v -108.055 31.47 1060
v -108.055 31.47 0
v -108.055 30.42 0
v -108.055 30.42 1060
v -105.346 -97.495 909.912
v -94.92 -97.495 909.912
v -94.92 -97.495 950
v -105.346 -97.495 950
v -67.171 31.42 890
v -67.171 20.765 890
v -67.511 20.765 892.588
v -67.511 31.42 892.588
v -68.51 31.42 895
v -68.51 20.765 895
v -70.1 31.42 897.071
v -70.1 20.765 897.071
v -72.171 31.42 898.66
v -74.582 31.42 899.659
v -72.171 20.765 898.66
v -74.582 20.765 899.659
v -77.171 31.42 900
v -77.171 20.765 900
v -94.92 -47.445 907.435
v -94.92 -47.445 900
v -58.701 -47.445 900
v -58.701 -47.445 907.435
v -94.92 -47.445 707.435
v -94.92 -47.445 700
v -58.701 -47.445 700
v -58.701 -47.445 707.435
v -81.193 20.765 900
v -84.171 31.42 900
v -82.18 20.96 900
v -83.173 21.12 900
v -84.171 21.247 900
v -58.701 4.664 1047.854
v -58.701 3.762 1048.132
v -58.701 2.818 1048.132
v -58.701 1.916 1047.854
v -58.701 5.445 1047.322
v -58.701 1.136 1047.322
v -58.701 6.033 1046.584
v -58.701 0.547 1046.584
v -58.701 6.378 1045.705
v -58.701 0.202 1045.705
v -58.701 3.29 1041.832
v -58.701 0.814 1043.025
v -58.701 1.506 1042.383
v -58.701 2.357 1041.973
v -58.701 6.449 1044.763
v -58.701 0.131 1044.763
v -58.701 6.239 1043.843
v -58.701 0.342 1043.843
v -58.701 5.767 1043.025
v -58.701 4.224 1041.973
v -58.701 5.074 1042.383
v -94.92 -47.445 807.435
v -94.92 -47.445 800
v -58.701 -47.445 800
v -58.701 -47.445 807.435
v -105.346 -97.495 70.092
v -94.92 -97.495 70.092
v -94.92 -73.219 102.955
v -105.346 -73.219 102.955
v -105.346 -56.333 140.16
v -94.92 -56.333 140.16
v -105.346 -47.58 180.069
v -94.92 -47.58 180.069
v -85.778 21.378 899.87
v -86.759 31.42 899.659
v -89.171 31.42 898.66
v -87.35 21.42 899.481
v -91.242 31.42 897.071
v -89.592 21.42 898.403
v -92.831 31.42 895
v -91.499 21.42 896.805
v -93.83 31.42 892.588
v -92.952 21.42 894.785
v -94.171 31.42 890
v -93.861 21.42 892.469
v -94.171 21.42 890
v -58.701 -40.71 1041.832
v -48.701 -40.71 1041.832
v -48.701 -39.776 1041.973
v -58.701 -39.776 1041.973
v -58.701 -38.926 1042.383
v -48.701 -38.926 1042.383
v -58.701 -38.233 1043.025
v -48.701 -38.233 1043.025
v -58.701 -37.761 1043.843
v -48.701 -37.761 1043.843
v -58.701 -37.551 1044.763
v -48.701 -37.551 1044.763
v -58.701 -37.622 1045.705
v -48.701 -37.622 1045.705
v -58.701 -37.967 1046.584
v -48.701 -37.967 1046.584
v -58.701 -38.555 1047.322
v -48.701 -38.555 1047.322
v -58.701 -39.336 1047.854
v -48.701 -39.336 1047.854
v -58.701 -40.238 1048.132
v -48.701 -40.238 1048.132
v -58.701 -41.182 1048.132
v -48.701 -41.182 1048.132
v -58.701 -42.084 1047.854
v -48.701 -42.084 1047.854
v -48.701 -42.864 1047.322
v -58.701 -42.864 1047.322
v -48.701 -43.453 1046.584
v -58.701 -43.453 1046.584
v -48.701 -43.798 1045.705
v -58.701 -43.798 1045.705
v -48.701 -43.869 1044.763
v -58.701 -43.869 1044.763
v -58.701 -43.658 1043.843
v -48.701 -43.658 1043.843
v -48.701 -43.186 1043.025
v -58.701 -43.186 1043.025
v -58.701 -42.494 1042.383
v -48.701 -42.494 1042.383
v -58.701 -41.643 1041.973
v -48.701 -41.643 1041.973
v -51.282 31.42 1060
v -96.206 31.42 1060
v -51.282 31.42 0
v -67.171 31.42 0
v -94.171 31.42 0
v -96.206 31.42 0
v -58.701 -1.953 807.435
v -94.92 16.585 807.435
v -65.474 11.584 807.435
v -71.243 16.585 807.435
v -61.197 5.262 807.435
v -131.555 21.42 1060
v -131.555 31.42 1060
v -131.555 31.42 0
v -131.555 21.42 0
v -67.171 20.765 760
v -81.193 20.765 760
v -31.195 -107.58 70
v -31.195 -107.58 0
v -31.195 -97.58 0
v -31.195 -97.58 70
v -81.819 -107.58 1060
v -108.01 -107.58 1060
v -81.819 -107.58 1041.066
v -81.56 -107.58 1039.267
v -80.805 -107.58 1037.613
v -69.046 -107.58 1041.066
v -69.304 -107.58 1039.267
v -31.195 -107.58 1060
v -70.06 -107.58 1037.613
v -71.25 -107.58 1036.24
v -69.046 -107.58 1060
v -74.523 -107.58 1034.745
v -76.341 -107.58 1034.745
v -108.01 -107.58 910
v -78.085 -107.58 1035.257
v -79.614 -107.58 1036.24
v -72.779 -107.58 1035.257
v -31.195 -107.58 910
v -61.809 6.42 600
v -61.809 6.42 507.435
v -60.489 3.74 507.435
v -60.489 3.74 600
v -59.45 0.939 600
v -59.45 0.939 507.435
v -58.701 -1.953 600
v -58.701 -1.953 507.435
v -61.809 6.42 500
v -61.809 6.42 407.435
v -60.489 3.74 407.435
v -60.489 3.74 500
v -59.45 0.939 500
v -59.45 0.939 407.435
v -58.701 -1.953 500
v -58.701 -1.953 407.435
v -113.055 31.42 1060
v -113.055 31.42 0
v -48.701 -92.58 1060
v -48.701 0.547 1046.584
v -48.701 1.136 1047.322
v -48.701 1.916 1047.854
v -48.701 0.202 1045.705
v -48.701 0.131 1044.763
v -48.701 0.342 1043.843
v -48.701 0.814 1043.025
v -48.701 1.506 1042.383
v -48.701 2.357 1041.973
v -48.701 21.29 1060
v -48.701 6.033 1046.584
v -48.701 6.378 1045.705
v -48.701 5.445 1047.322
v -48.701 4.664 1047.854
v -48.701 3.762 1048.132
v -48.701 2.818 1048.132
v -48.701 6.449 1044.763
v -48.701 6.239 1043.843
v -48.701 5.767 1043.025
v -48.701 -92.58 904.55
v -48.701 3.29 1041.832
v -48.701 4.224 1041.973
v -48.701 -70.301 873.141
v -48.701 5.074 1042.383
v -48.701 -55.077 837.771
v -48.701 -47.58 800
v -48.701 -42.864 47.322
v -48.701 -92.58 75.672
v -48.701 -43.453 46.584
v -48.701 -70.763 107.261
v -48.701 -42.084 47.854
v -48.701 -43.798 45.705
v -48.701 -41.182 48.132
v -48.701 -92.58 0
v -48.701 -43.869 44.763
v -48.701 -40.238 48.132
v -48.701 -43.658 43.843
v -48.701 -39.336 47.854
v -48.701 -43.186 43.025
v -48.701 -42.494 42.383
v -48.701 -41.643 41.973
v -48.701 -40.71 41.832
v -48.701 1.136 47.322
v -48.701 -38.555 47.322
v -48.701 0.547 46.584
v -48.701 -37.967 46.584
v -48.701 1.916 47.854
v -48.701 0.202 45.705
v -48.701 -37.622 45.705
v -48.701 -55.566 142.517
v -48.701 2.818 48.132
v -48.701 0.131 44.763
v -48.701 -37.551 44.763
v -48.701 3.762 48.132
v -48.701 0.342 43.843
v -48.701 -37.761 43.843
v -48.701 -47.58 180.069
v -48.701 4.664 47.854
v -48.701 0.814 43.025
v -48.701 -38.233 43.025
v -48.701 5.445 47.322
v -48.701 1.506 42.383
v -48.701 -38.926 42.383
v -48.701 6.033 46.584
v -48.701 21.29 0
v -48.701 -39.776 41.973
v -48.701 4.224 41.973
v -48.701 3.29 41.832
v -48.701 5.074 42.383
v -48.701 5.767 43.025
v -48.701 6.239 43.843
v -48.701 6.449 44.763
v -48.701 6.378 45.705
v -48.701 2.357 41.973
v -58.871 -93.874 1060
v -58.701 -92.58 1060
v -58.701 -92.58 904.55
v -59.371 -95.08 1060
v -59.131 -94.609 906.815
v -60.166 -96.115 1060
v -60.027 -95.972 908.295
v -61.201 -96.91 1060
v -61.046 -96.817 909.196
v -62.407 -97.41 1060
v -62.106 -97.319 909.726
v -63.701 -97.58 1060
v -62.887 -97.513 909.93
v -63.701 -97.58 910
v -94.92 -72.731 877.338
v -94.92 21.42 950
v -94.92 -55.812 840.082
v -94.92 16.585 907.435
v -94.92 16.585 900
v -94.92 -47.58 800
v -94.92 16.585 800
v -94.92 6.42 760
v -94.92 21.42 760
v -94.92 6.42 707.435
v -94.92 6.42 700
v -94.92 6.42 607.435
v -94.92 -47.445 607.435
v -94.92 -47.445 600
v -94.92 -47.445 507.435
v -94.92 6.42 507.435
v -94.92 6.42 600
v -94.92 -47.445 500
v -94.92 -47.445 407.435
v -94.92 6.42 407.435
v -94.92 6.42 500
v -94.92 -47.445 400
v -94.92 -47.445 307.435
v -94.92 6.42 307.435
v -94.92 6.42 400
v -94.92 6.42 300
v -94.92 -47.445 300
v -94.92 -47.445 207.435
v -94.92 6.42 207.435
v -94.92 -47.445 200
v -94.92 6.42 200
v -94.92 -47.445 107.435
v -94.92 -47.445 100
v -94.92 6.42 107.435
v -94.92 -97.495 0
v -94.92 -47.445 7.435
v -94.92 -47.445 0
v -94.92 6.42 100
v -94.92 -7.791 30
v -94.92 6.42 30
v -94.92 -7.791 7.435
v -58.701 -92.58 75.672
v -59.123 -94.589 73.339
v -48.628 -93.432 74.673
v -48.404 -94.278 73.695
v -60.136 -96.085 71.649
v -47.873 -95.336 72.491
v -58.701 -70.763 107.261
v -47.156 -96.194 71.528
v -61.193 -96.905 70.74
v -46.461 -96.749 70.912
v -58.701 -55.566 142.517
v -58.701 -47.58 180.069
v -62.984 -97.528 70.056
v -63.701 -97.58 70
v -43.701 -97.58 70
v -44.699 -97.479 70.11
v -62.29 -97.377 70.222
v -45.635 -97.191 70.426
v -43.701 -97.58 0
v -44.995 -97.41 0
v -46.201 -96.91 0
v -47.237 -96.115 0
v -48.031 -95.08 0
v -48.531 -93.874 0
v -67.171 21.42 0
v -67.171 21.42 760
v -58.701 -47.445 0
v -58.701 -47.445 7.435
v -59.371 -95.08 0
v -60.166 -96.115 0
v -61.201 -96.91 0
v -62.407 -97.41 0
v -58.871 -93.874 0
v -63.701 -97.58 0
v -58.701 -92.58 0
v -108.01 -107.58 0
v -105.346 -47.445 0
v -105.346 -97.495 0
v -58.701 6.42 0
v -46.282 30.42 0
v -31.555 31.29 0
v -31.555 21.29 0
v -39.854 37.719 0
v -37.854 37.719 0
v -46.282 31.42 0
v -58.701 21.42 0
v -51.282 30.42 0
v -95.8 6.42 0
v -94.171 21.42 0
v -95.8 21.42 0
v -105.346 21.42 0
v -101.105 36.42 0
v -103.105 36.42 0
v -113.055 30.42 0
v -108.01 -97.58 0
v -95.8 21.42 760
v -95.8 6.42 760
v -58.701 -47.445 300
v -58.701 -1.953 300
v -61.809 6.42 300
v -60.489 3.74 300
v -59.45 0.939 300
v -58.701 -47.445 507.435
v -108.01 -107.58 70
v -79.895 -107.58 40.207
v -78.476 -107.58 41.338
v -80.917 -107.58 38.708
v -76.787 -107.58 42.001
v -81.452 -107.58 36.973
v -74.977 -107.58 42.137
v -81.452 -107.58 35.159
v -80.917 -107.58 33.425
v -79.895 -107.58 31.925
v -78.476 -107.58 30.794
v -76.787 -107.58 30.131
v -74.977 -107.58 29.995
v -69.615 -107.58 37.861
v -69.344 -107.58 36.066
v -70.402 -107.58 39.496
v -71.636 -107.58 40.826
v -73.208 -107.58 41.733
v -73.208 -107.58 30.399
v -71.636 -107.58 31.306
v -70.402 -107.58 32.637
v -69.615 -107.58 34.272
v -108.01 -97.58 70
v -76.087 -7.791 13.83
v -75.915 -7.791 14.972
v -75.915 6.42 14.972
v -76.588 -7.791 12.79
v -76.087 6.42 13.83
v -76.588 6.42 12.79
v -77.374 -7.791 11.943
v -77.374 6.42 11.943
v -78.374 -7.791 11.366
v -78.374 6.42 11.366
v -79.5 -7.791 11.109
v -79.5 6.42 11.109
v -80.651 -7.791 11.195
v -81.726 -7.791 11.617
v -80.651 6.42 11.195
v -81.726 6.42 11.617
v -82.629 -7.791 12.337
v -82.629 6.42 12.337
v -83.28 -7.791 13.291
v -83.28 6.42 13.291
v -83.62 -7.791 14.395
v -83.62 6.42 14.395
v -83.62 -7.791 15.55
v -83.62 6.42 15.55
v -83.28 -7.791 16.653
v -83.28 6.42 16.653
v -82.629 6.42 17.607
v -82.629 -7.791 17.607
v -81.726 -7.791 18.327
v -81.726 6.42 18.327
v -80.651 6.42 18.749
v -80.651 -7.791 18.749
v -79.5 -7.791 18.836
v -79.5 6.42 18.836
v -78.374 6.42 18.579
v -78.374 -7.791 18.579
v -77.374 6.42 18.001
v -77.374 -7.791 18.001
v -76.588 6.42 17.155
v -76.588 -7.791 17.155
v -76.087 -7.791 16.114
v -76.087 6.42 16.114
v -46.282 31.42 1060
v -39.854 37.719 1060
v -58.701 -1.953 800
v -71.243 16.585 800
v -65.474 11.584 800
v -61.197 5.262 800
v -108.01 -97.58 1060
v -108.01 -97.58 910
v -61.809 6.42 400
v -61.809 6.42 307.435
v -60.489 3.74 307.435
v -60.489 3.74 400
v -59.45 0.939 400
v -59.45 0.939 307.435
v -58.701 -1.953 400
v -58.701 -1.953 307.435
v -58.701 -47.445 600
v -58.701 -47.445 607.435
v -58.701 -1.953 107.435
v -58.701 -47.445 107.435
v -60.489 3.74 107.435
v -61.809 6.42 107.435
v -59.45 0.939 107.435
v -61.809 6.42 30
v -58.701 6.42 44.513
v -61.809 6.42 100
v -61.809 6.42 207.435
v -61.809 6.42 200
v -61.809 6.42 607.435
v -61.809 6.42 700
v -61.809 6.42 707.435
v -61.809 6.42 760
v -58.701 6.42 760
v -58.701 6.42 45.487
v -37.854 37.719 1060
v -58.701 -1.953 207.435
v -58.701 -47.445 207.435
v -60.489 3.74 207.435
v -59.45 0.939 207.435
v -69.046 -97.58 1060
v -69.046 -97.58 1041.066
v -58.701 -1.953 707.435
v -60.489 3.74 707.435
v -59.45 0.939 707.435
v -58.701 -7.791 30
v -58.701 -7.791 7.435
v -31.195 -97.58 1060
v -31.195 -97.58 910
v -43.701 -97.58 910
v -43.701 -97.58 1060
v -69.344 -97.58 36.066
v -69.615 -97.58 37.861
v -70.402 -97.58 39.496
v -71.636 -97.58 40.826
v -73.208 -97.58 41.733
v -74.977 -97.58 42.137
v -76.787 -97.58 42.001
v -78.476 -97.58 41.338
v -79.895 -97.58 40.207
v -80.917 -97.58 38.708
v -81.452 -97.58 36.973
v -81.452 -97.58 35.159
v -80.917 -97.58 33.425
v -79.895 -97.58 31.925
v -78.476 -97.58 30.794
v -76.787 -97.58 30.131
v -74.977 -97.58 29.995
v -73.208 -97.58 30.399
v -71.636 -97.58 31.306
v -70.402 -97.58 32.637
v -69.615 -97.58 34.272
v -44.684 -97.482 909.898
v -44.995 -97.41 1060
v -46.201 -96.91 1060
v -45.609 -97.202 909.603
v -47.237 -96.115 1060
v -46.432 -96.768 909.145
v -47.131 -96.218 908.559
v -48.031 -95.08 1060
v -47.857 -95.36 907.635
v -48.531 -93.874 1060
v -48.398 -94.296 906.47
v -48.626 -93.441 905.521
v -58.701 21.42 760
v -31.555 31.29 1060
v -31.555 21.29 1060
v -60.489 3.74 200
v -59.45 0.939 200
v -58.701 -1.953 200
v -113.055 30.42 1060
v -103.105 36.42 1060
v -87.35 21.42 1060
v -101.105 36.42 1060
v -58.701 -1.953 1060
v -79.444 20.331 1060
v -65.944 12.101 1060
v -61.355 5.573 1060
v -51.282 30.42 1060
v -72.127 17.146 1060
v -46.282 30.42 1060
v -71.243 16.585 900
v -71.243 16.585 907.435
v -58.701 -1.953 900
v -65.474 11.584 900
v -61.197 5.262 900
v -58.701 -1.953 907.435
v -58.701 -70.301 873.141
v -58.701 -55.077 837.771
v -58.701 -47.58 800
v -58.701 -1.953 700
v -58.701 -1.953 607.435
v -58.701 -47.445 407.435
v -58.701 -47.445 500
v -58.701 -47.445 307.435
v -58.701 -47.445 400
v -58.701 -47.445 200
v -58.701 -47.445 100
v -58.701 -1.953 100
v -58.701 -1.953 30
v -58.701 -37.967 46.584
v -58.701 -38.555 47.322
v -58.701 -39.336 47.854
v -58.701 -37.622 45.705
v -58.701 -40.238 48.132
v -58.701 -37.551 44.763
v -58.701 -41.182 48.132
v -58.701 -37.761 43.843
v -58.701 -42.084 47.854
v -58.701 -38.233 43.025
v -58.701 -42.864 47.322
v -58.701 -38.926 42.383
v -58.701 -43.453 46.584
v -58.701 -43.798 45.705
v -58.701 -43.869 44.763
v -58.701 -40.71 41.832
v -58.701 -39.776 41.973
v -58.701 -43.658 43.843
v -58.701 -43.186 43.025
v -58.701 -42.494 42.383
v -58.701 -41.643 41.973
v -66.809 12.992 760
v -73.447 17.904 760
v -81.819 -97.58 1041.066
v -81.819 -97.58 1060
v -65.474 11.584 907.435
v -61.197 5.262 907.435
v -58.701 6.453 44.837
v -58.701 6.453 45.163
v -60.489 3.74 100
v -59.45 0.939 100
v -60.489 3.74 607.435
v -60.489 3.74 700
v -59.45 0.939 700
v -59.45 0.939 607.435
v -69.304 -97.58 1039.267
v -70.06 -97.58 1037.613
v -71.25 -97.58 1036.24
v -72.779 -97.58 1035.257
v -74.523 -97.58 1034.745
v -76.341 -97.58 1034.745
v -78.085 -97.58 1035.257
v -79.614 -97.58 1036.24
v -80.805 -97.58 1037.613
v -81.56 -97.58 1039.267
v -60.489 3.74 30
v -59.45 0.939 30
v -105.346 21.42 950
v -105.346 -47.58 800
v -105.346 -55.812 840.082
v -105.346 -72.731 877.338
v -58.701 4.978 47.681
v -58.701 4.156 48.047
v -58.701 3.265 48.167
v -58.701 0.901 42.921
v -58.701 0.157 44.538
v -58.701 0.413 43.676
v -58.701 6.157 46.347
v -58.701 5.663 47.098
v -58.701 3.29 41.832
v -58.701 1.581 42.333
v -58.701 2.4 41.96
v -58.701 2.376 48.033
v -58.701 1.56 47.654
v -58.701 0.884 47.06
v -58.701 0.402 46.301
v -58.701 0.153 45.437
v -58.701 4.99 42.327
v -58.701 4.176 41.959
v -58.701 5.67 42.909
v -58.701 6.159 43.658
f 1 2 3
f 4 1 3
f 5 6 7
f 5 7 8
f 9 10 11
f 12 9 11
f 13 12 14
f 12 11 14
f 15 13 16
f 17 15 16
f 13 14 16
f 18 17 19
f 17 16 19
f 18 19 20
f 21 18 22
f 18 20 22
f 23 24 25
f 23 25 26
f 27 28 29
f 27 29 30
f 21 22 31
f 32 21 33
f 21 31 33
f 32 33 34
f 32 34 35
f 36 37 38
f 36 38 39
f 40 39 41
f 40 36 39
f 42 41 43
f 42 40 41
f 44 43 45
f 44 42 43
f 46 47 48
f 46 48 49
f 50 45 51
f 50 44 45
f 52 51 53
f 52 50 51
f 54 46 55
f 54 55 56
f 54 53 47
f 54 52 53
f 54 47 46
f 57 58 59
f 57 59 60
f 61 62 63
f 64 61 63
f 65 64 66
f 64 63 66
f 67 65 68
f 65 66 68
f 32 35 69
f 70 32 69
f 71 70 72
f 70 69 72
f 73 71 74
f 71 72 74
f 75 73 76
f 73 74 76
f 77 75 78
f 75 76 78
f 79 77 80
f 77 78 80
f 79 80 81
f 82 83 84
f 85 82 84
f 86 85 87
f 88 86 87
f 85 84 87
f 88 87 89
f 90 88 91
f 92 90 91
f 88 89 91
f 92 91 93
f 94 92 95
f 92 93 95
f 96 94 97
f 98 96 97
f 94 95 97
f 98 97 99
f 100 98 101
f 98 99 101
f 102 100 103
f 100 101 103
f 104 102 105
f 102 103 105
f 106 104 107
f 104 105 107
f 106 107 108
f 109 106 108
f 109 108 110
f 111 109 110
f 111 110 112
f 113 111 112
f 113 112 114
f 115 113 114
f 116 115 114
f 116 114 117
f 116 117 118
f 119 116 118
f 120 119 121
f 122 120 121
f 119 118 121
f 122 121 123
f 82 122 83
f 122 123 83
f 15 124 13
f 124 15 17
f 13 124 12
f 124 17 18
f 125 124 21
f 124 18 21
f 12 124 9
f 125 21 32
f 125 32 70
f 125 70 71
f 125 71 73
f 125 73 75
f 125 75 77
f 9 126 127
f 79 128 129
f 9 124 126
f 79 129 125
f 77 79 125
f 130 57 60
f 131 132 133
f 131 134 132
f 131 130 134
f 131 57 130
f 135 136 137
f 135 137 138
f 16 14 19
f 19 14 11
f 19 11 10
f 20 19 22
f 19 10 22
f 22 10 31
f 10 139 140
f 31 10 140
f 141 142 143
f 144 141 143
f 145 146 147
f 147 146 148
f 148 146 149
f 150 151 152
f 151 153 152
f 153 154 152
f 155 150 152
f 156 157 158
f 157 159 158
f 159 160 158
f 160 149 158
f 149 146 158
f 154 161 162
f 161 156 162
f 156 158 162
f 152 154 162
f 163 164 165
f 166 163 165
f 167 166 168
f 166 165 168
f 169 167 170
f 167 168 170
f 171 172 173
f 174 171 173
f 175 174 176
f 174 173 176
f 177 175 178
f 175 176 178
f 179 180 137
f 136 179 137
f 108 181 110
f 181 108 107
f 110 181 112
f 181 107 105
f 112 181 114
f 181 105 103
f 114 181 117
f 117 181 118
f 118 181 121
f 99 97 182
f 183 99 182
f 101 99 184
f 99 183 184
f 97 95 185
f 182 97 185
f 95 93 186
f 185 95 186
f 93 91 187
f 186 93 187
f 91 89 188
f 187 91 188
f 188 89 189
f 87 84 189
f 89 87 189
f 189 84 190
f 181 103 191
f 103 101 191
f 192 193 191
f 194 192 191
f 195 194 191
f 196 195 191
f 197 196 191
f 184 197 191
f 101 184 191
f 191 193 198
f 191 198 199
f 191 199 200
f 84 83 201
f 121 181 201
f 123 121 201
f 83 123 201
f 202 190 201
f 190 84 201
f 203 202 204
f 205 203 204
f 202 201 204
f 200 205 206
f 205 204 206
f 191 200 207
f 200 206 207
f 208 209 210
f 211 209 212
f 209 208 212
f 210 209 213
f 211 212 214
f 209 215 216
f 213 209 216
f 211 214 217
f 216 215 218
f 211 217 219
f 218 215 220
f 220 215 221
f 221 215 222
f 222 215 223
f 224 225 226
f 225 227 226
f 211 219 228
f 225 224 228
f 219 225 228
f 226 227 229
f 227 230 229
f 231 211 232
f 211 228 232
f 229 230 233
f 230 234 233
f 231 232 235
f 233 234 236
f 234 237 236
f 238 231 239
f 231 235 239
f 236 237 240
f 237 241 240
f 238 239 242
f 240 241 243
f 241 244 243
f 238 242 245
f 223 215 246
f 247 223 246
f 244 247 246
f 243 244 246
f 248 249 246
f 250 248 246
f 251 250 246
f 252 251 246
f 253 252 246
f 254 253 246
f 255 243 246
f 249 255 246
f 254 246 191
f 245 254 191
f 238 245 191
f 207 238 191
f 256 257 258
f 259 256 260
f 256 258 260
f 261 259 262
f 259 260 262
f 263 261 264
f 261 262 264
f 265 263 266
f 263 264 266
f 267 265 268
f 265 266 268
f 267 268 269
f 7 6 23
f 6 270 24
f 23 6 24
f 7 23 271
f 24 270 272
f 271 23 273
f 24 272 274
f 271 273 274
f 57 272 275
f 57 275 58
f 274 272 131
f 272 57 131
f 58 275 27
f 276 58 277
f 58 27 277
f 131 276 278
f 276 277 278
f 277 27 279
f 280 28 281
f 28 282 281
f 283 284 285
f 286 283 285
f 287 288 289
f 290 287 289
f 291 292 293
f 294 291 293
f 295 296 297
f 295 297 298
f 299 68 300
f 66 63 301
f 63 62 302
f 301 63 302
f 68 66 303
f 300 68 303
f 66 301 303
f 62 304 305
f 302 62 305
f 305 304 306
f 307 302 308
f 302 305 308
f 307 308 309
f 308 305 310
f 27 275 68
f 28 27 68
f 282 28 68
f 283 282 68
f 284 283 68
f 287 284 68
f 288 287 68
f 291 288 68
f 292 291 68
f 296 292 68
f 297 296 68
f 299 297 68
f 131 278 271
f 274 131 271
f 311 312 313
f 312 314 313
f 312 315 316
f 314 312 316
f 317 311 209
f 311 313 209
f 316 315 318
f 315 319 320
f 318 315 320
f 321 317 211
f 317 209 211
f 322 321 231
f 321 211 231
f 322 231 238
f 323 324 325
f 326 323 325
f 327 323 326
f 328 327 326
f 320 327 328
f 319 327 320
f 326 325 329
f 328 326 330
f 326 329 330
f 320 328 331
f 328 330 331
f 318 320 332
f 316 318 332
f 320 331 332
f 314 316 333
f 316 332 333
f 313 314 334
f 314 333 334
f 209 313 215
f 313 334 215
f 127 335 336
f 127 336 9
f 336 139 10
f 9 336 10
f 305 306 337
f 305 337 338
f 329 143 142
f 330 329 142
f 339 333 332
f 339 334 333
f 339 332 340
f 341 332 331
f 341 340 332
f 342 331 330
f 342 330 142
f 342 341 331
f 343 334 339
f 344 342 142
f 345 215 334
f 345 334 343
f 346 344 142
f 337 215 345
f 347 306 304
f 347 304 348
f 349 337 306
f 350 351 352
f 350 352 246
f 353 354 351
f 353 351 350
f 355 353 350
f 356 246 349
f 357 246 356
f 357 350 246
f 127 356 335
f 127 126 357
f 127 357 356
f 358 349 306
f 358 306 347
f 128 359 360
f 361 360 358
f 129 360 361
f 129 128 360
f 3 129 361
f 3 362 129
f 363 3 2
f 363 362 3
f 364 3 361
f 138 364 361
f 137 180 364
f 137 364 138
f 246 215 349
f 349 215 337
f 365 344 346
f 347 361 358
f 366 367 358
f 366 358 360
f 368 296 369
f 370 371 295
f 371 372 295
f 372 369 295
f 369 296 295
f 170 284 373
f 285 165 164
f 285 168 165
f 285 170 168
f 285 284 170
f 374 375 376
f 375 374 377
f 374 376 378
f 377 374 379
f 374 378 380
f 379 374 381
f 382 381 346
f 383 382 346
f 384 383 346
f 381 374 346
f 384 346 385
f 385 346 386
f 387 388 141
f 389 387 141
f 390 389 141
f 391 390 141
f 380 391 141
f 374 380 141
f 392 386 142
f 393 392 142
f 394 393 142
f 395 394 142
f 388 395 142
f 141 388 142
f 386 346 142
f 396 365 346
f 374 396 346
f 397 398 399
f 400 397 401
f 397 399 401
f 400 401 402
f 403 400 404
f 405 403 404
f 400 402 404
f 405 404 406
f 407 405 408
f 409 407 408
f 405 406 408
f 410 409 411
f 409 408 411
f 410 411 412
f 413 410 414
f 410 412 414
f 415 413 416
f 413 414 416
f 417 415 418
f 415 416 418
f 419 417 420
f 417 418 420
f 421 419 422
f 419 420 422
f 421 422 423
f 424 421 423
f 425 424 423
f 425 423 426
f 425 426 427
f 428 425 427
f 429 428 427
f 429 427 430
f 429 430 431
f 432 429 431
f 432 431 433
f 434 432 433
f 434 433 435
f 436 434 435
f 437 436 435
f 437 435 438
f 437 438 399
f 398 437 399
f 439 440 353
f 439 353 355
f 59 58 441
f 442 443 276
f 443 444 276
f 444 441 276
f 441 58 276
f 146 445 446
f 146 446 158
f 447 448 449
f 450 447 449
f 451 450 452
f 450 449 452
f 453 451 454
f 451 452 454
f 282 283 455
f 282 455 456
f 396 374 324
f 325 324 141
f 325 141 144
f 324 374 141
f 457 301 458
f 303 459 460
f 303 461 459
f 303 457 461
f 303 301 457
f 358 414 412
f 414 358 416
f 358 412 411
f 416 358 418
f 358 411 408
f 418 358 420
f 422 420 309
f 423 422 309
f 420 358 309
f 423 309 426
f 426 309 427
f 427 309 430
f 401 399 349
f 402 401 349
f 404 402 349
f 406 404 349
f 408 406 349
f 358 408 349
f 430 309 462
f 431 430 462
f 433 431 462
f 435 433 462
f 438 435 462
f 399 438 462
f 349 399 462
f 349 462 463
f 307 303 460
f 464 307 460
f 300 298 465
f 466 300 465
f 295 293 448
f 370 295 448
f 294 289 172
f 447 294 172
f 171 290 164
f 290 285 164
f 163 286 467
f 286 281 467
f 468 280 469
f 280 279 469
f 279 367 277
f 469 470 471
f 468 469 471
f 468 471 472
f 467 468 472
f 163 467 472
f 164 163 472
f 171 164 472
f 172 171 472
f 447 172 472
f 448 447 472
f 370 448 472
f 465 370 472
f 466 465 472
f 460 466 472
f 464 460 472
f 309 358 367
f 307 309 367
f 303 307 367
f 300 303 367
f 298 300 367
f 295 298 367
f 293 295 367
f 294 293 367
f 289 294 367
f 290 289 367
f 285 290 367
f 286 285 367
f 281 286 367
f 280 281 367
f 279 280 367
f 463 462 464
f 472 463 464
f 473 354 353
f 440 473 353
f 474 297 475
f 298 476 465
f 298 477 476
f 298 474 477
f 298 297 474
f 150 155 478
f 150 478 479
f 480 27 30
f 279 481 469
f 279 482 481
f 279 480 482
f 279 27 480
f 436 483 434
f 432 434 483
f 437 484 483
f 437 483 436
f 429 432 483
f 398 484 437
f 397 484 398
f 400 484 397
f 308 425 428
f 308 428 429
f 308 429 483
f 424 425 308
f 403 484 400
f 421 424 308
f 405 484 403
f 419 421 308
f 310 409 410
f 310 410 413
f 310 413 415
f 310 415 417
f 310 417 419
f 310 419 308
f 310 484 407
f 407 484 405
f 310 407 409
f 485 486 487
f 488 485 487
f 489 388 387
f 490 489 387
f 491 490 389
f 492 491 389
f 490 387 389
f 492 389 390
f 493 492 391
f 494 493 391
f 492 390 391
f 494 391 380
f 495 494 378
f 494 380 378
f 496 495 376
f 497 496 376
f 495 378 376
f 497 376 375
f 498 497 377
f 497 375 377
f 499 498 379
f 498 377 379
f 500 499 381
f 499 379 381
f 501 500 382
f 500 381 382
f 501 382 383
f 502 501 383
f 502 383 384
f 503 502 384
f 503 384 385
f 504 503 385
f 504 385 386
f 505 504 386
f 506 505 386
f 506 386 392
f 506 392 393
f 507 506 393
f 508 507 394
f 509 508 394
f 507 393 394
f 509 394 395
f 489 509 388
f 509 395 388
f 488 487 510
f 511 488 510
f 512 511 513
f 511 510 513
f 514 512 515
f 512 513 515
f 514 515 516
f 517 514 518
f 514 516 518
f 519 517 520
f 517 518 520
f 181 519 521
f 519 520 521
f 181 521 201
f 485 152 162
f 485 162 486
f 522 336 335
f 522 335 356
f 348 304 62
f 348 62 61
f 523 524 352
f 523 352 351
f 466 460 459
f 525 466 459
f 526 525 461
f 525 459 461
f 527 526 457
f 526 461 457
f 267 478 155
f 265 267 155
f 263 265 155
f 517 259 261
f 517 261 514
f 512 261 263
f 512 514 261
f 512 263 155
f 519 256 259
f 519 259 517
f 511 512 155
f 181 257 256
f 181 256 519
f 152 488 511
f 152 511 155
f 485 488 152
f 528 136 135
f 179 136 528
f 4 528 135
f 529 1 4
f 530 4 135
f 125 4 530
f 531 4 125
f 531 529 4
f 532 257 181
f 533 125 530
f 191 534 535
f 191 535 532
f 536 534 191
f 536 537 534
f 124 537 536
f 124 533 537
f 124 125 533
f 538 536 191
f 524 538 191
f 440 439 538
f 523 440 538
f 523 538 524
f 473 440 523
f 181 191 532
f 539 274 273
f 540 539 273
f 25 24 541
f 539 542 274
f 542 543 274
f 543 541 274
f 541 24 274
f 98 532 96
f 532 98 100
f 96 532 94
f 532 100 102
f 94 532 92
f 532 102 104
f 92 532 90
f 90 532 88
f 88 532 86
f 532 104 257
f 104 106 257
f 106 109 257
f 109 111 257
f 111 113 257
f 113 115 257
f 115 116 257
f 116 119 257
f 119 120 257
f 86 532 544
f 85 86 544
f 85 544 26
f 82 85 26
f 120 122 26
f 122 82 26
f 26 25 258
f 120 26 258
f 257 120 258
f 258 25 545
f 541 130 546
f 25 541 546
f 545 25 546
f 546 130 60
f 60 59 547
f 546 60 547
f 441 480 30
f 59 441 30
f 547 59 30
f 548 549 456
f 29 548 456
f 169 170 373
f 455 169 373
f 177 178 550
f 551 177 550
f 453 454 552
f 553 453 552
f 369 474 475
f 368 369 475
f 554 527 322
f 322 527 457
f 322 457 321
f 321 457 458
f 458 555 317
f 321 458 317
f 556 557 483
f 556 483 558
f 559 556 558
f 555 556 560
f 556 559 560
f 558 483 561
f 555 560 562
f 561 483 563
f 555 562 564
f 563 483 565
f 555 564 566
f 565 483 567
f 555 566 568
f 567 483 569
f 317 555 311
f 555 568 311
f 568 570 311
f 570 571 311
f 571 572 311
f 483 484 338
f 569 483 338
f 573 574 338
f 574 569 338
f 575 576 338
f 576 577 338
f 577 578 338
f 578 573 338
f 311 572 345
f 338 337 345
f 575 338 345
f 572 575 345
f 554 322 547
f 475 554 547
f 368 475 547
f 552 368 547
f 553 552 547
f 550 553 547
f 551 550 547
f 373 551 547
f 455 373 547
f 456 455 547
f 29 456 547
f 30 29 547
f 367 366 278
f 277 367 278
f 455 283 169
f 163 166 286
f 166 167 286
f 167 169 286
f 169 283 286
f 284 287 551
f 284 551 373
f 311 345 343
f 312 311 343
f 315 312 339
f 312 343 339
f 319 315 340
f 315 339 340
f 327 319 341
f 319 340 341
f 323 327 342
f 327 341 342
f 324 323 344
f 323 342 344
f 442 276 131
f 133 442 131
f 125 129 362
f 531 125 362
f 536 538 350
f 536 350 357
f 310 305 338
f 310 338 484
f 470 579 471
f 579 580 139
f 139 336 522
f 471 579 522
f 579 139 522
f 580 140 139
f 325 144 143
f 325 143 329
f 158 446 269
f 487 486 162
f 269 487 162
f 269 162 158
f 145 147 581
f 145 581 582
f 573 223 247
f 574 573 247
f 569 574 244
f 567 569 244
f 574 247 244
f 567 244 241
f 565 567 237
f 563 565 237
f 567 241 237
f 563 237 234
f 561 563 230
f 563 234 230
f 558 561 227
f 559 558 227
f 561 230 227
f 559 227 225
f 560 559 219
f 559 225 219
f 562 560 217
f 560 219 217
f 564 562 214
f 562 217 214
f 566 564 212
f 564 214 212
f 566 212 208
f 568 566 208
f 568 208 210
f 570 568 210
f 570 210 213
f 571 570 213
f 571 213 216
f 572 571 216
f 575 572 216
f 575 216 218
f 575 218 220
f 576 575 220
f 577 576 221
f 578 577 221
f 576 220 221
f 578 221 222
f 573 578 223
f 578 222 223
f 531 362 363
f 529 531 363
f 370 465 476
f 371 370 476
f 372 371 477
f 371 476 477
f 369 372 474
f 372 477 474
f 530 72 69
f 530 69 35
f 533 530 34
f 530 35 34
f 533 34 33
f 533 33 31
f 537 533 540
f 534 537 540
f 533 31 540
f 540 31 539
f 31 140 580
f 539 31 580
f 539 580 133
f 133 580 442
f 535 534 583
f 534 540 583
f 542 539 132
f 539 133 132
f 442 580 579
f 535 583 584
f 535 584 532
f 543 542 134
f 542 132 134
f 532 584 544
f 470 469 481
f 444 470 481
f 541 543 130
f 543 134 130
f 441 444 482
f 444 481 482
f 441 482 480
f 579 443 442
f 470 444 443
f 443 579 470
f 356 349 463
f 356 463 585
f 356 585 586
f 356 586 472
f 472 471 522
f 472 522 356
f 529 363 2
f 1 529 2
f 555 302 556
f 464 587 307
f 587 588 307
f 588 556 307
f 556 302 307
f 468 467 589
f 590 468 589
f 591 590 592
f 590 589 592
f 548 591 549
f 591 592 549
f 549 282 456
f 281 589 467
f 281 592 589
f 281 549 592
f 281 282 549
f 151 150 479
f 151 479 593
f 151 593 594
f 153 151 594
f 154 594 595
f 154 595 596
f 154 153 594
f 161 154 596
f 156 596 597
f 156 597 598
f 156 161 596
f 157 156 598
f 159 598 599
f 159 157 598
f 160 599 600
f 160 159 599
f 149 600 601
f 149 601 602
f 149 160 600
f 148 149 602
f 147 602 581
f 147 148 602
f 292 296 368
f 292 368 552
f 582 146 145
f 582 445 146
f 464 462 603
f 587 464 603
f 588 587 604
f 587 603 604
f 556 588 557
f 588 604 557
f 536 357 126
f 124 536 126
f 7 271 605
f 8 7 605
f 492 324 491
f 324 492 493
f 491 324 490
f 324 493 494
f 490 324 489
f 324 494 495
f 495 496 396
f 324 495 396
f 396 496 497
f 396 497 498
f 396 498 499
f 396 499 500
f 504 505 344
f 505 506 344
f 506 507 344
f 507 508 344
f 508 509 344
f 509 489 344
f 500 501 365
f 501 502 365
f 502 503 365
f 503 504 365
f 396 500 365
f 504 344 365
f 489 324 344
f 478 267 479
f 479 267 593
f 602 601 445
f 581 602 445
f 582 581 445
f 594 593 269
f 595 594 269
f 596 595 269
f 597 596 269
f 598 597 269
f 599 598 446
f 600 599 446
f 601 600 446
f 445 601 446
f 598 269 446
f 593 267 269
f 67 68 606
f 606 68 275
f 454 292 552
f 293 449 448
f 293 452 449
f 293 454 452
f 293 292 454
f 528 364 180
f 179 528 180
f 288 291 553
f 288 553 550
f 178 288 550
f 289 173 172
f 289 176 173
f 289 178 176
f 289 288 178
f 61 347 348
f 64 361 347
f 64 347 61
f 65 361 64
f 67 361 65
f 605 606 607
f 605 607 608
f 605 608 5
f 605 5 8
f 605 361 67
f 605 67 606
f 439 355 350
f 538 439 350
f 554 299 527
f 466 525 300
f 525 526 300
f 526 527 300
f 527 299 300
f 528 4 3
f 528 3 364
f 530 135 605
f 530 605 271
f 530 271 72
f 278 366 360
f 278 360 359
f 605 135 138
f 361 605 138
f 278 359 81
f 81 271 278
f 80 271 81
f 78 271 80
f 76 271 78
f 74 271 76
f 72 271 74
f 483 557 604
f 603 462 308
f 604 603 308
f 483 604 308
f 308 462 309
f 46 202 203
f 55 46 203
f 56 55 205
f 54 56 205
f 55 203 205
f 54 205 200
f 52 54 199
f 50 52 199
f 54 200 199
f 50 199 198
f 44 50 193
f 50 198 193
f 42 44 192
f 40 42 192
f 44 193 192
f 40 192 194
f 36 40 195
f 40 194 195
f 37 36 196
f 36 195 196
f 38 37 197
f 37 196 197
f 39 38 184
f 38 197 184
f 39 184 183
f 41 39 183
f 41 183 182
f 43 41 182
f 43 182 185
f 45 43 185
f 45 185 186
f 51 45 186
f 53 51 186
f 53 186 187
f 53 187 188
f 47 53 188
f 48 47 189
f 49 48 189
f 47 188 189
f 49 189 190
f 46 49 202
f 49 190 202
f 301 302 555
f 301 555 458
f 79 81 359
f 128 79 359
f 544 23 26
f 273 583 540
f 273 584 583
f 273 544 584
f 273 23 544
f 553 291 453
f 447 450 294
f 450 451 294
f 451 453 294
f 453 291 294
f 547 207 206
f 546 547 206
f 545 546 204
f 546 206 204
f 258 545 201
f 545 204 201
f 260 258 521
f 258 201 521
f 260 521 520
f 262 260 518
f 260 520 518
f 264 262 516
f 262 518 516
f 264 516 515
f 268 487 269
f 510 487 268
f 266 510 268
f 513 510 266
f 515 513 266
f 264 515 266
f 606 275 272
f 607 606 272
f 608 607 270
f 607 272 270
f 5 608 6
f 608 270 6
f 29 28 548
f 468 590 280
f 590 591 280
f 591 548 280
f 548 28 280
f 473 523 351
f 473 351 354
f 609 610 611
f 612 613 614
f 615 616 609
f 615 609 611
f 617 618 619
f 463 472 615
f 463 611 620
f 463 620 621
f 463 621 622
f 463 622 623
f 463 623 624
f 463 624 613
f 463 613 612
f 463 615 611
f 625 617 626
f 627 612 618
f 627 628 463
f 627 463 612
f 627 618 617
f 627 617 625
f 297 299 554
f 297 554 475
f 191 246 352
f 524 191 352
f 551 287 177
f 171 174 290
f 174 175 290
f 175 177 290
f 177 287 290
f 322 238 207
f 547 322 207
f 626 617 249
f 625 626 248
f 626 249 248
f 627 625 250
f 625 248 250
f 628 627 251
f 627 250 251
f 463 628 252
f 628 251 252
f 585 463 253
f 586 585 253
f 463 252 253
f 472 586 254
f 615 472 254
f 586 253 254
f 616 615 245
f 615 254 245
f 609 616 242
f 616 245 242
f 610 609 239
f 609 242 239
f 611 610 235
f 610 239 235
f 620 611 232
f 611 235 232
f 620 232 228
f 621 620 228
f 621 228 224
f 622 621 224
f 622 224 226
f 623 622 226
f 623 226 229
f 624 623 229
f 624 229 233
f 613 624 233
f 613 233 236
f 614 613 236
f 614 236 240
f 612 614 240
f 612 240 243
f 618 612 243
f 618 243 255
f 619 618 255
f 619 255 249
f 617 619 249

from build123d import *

# Parameters (mm, degrees)
BOSS_EXTRUDE1_DEPTH         = 1060
CUT_EXTRUDE1_DEPTH          = 800
SKETCH5_W                   = 10.426623187
SKETCH5_H                   = 125.292137731
BOSS_EXTRUDE2_DEPTH         = 950
SKETCH6_W                   = 7.435137382
SKETCH6_H                   = 64.029540506
BOSS_EXTRUDE3_DEPTH         = 50
LPATTERN1_COUNT             = 10
LPATTERN1_PITCH             = 100
CUT_EXTRUDE3_DEPTH          = 10
CUT_EXTRUDE3_DEPTH_BACK     = 100
CUT_EXTRUDE2_START          = -300
SKETCH3_W                   = 37.098457344
SKETCH3_H                   = 15
CUT_EXTRUDE2_DEPTH          = 1000
SKETCH7_W                   = 41.986295648
SKETCH7_H                   = 14.210937294
BOSS_EXTRUDE4_DEPTH         = 30
SKETCH8_R                   = 3.874254892
CUT_EXTRUDE4_DEPTH          = 30
SKETCH_1_R                  = 3.167509586
CUT_EXTRUDE_1_DEPTH         = 10
PATTERN_LINEAR_1_COUNT      = 2
PATTERN_LINEAR_1_PITCH      = 44
PATTERN_LINEAR_1_COUNT_DIR2 = 2
PATTERN_LINEAR_1_PITCH_DIR2 = 1000
SKETCH9_R                   = 6.088028913
CUT_EXTRUDE5_DEPTH          = 10
LPATTERN2_COUNT             = 2
LPATTERN2_PITCH             = 1005
CUT_EXTRUDE6_DEPTH          = 10


with BuildPart() as part:
    # Sketch1 → Boss-Extrude1 (new body)
    with BuildSketch(Plane.XY):
        with BuildLine():
            Line((-31.555119126, 31.290150882), (-37.853807036, 37.718722311))
            Line((-37.853807036, 37.718722311), (-39.853807036, 37.718722311))
            Line((-39.853807036, 37.718722311), (-46.282378465, 31.420034401))
            Line((-46.282378465, 31.420034401), (-46.282378465, 30.420034401))
            Line((-46.282378465, 30.420034401), (-51.282378465, 30.420034401))
            Line((-51.282378465, 30.420034401), (-51.282378465, 31.420034401))
            Line((-51.282378465, 31.420034401), (-96.206307824, 31.420034401))
            Line((-96.206307824, 31.420034401), (-101.105287309, 36.420034401))
            Line((-101.105287309, 36.420034401), (-103.105287309, 36.420034401))
            Line((-103.105287309, 36.420034401), (-108.055034777, 31.470286932))
            Line((-108.055034777, 31.470286932), (-108.055034777, 30.420034401))
            Line((-108.055034777, 30.420034401), (-113.055034777, 30.420034401))
            Line((-113.055034777, 30.420034401), (-113.055034777, 31.420034401))
            Line((-113.055034777, 31.420034401), (-131.555034777, 31.420034401))
            Line((-131.555034777, 31.420034401), (-131.555034777, 21.420034401))
            Line((-131.555034777, 21.420034401), (-87.349569261, 21.420034401))
            ThreePointArc((-87.349569261, 21.420034401), (-68.862935324, 14.835575372), (-58.701074529, -1.95273366))
            Line((-58.701074529, -1.95273366), (-58.701074529, -92.579965599))
            ThreePointArc((-58.701074529, -92.579965599), (-60.165540623, -96.115499505), (-63.701074529, -97.579965599))
            Line((-63.701074529, -97.579965599), (-108.009983562, -97.579965599))
            Line((-108.009983562, -97.579965599), (-108.009983562, -107.579965599))
            Line((-108.009983562, -107.579965599), (-31.195424592, -107.579965599))
            Line((-31.195424592, -107.579965599), (-31.195424592, -97.579965599))
            Line((-31.195424592, -97.579965599), (-43.701074529, -97.579965599))
            ThreePointArc((-43.701074529, -97.579965599), (-47.236608435, -96.115499505), (-48.701074529, -92.579965599))
            Line((-48.701074529, -92.579965599), (-48.701074529, 21.290150882))
            Line((-48.701074529, 21.290150882), (-31.555119126, 21.290150882))
            Line((-31.555119126, 21.290150882), (-31.555119126, 31.290150882))
        make_face()
    extrude(amount=BOSS_EXTRUDE1_DEPTH)

    # Sketch2 → Cut-Extrude1 (cut)
    with BuildSketch(Plane(origin=(0, 20.764722339, 0), x_dir=(1, 0, 0), z_dir=(0, 1, 0))):
        with BuildLine():
            Line((-84.170689991, 100), (-77.170689991, 100))
            ThreePointArc((-77.170689991, 100), (-70.099622179, 97.071067812), (-67.170689991, 90))
            Line((-67.170689991, 90), (-67.170689991, -890))
            ThreePointArc((-67.170689991, -890), (-70.099622179, -897.071067812), (-77.170689991, -900))
            Line((-77.170689991, -900), (-84.170689991, -900))
            ThreePointArc((-84.170689991, -900), (-91.241757803, -897.071067812), (-94.170689991, -890))
            Line((-94.170689991, -890), (-94.170689991, 90))
            ThreePointArc((-94.170689991, 90), (-91.241757803, 97.071067812), (-84.170689991, 100))
        make_face()
    extrude(amount=CUT_EXTRUDE1_DEPTH, mode=Mode.SUBTRACT)

    # Sketch5 → Boss-Extrude2 (add)
    with BuildSketch(Plane(origin=(0, 0, 0), x_dir=(-1, 0, 0), z_dir=(0, 0, -1))):
        with Locations((100.133130522, -34.849417223)):
            Rectangle(SKETCH5_W, SKETCH5_H)
    extrude(amount=-BOSS_EXTRUDE2_DEPTH)

    # Sketch6 → Boss-Extrude3 (add)
    with BuildSketch(Plane.ZY.offset(105.346442115)):
        with Locations((3.717568691, -15.430068515)):
            Rectangle(SKETCH6_W, SKETCH6_H)
    boss_extrude3 = extrude(amount=-BOSS_EXTRUDE3_DEPTH)

    # LPattern1: Boss-Extrude3 ×10
    with Locations(*[(0, 0, i * LPATTERN1_PITCH) for i in range(1, LPATTERN1_COUNT)]):
        add(boss_extrude3)

    # Sketch4 → Cut-Extrude3 (cut, two sides)
    with BuildSketch(Plane(origin=(-31.555119126, 0, 0), x_dir=(0, 0, -1), z_dir=(1, 0, 0))) as cut_extrude3_sk:
        with BuildLine():
            Line((-910, -97.579965599), (-910, -107.579965599))
            Line((-910, -107.579965599), (-910, -177.956634241))
            Line((-910, -177.956634241), (-70, -177.956634241))
            Line((-70, -177.956634241), (-70, -97.579965599))
            ThreePointArc((-70, -97.579965599), (-121.056751887, -63.823667059), (-180.068799532, -47.579965599))
            Line((-180.068799532, -47.579965599), (-800, -47.579965599))
            ThreePointArc((-800, -47.579965599), (-859.23910305, -63.253938888), (-910, -97.579965599))
        make_face()
    extrude(amount=CUT_EXTRUDE3_DEPTH, mode=Mode.SUBTRACT)
    extrude(cut_extrude3_sk.sketch, amount=-CUT_EXTRUDE3_DEPTH_BACK, mode=Mode.SUBTRACT)

    # Sketch3 → Cut-Extrude2 (cut)
    with BuildSketch(Plane.XY.offset(1060).offset(CUT_EXTRUDE2_START)):
        with Locations((-77.250303201, 13.920034401)):
            Rectangle(SKETCH3_W, SKETCH3_H)
    extrude(amount=-CUT_EXTRUDE2_DEPTH, mode=Mode.SUBTRACT)

    # Sketch7 → Boss-Extrude4 (add)
    with BuildSketch(Plane(origin=(0, 0, 0), x_dir=(-1, 0, 0), z_dir=(0, 0, -1))):
        with Locations((78.756733265, -0.685434246)):
            Rectangle(SKETCH7_W, SKETCH7_H)
    extrude(amount=-BOSS_EXTRUDE4_DEPTH)

    # Sketch8 → Cut-Extrude4 (cut)
    with BuildSketch(Plane(origin=(0, 6.420034401, 0), x_dir=(1, 0, 0), z_dir=(0, 1, 0))):
        with Locations((-79.789069173, -14.972288239)):
            Circle(SKETCH8_R)
    extrude(amount=-CUT_EXTRUDE4_DEPTH, mode=Mode.SUBTRACT)

    # Эскиз1 → Вырез-Вытянуть1 (cut)
    with BuildSketch(Plane(origin=(-48.701074529, 0, 0), x_dir=(0, 0, -1), z_dir=(1, 0, 0))):
        with Locations((-45, 3.290150882)):
            Circle(SKETCH_1_R)
    cut_extrude_1 = extrude(amount=-CUT_EXTRUDE_1_DEPTH, mode=Mode.SUBTRACT)

    # Линейный массив1: Cut-Extrude 1 2 × 2
    with Locations(*[(0, -i * PATTERN_LINEAR_1_PITCH, j * PATTERN_LINEAR_1_PITCH_DIR2) for i in range(PATTERN_LINEAR_1_COUNT) for j in range(PATTERN_LINEAR_1_COUNT_DIR2) if (i, j) != (0, 0)]):
        add(cut_extrude_1, mode=Mode.SUBTRACT)

    # Sketch9 → Cut-Extrude5 (cut)
    with BuildSketch(Plane.XZ.offset(107.579965599)):
        with Locations((-75.432174638, 36.066091654)):
            Circle(SKETCH9_R)
    cut_extrude5 = extrude(amount=-CUT_EXTRUDE5_DEPTH, mode=Mode.SUBTRACT)

    # LPattern2: Cut-Extrude5 ×2
    with Locations(*[(0, 0, i * LPATTERN2_PITCH) for i in range(1, LPATTERN2_COUNT)]):
        add(cut_extrude5, mode=Mode.SUBTRACT)

    # Sketch10 → Cut-Extrude6 (cut)
    with BuildSketch(Plane.XZ.offset(107.579965599)):
        with BuildLine():
            Line((-81.818611273, 1041.066091654), (-81.818611273, 1067.229436247))
            ThreePointArc((-81.818611273, 1067.229436247), (-75.432174638, 1073.615872882), (-69.045738002, 1067.229436247))
            Line((-69.045738002, 1067.229436247), (-69.045738002, 1041.066091654))
            ThreePointArc((-69.045738002, 1041.066091654), (-75.432174638, 1034.679655018), (-81.818611273, 1041.066091654))
        make_face()
    extrude(amount=-CUT_EXTRUDE6_DEPTH, mode=Mode.SUBTRACT)


solid = part.part
